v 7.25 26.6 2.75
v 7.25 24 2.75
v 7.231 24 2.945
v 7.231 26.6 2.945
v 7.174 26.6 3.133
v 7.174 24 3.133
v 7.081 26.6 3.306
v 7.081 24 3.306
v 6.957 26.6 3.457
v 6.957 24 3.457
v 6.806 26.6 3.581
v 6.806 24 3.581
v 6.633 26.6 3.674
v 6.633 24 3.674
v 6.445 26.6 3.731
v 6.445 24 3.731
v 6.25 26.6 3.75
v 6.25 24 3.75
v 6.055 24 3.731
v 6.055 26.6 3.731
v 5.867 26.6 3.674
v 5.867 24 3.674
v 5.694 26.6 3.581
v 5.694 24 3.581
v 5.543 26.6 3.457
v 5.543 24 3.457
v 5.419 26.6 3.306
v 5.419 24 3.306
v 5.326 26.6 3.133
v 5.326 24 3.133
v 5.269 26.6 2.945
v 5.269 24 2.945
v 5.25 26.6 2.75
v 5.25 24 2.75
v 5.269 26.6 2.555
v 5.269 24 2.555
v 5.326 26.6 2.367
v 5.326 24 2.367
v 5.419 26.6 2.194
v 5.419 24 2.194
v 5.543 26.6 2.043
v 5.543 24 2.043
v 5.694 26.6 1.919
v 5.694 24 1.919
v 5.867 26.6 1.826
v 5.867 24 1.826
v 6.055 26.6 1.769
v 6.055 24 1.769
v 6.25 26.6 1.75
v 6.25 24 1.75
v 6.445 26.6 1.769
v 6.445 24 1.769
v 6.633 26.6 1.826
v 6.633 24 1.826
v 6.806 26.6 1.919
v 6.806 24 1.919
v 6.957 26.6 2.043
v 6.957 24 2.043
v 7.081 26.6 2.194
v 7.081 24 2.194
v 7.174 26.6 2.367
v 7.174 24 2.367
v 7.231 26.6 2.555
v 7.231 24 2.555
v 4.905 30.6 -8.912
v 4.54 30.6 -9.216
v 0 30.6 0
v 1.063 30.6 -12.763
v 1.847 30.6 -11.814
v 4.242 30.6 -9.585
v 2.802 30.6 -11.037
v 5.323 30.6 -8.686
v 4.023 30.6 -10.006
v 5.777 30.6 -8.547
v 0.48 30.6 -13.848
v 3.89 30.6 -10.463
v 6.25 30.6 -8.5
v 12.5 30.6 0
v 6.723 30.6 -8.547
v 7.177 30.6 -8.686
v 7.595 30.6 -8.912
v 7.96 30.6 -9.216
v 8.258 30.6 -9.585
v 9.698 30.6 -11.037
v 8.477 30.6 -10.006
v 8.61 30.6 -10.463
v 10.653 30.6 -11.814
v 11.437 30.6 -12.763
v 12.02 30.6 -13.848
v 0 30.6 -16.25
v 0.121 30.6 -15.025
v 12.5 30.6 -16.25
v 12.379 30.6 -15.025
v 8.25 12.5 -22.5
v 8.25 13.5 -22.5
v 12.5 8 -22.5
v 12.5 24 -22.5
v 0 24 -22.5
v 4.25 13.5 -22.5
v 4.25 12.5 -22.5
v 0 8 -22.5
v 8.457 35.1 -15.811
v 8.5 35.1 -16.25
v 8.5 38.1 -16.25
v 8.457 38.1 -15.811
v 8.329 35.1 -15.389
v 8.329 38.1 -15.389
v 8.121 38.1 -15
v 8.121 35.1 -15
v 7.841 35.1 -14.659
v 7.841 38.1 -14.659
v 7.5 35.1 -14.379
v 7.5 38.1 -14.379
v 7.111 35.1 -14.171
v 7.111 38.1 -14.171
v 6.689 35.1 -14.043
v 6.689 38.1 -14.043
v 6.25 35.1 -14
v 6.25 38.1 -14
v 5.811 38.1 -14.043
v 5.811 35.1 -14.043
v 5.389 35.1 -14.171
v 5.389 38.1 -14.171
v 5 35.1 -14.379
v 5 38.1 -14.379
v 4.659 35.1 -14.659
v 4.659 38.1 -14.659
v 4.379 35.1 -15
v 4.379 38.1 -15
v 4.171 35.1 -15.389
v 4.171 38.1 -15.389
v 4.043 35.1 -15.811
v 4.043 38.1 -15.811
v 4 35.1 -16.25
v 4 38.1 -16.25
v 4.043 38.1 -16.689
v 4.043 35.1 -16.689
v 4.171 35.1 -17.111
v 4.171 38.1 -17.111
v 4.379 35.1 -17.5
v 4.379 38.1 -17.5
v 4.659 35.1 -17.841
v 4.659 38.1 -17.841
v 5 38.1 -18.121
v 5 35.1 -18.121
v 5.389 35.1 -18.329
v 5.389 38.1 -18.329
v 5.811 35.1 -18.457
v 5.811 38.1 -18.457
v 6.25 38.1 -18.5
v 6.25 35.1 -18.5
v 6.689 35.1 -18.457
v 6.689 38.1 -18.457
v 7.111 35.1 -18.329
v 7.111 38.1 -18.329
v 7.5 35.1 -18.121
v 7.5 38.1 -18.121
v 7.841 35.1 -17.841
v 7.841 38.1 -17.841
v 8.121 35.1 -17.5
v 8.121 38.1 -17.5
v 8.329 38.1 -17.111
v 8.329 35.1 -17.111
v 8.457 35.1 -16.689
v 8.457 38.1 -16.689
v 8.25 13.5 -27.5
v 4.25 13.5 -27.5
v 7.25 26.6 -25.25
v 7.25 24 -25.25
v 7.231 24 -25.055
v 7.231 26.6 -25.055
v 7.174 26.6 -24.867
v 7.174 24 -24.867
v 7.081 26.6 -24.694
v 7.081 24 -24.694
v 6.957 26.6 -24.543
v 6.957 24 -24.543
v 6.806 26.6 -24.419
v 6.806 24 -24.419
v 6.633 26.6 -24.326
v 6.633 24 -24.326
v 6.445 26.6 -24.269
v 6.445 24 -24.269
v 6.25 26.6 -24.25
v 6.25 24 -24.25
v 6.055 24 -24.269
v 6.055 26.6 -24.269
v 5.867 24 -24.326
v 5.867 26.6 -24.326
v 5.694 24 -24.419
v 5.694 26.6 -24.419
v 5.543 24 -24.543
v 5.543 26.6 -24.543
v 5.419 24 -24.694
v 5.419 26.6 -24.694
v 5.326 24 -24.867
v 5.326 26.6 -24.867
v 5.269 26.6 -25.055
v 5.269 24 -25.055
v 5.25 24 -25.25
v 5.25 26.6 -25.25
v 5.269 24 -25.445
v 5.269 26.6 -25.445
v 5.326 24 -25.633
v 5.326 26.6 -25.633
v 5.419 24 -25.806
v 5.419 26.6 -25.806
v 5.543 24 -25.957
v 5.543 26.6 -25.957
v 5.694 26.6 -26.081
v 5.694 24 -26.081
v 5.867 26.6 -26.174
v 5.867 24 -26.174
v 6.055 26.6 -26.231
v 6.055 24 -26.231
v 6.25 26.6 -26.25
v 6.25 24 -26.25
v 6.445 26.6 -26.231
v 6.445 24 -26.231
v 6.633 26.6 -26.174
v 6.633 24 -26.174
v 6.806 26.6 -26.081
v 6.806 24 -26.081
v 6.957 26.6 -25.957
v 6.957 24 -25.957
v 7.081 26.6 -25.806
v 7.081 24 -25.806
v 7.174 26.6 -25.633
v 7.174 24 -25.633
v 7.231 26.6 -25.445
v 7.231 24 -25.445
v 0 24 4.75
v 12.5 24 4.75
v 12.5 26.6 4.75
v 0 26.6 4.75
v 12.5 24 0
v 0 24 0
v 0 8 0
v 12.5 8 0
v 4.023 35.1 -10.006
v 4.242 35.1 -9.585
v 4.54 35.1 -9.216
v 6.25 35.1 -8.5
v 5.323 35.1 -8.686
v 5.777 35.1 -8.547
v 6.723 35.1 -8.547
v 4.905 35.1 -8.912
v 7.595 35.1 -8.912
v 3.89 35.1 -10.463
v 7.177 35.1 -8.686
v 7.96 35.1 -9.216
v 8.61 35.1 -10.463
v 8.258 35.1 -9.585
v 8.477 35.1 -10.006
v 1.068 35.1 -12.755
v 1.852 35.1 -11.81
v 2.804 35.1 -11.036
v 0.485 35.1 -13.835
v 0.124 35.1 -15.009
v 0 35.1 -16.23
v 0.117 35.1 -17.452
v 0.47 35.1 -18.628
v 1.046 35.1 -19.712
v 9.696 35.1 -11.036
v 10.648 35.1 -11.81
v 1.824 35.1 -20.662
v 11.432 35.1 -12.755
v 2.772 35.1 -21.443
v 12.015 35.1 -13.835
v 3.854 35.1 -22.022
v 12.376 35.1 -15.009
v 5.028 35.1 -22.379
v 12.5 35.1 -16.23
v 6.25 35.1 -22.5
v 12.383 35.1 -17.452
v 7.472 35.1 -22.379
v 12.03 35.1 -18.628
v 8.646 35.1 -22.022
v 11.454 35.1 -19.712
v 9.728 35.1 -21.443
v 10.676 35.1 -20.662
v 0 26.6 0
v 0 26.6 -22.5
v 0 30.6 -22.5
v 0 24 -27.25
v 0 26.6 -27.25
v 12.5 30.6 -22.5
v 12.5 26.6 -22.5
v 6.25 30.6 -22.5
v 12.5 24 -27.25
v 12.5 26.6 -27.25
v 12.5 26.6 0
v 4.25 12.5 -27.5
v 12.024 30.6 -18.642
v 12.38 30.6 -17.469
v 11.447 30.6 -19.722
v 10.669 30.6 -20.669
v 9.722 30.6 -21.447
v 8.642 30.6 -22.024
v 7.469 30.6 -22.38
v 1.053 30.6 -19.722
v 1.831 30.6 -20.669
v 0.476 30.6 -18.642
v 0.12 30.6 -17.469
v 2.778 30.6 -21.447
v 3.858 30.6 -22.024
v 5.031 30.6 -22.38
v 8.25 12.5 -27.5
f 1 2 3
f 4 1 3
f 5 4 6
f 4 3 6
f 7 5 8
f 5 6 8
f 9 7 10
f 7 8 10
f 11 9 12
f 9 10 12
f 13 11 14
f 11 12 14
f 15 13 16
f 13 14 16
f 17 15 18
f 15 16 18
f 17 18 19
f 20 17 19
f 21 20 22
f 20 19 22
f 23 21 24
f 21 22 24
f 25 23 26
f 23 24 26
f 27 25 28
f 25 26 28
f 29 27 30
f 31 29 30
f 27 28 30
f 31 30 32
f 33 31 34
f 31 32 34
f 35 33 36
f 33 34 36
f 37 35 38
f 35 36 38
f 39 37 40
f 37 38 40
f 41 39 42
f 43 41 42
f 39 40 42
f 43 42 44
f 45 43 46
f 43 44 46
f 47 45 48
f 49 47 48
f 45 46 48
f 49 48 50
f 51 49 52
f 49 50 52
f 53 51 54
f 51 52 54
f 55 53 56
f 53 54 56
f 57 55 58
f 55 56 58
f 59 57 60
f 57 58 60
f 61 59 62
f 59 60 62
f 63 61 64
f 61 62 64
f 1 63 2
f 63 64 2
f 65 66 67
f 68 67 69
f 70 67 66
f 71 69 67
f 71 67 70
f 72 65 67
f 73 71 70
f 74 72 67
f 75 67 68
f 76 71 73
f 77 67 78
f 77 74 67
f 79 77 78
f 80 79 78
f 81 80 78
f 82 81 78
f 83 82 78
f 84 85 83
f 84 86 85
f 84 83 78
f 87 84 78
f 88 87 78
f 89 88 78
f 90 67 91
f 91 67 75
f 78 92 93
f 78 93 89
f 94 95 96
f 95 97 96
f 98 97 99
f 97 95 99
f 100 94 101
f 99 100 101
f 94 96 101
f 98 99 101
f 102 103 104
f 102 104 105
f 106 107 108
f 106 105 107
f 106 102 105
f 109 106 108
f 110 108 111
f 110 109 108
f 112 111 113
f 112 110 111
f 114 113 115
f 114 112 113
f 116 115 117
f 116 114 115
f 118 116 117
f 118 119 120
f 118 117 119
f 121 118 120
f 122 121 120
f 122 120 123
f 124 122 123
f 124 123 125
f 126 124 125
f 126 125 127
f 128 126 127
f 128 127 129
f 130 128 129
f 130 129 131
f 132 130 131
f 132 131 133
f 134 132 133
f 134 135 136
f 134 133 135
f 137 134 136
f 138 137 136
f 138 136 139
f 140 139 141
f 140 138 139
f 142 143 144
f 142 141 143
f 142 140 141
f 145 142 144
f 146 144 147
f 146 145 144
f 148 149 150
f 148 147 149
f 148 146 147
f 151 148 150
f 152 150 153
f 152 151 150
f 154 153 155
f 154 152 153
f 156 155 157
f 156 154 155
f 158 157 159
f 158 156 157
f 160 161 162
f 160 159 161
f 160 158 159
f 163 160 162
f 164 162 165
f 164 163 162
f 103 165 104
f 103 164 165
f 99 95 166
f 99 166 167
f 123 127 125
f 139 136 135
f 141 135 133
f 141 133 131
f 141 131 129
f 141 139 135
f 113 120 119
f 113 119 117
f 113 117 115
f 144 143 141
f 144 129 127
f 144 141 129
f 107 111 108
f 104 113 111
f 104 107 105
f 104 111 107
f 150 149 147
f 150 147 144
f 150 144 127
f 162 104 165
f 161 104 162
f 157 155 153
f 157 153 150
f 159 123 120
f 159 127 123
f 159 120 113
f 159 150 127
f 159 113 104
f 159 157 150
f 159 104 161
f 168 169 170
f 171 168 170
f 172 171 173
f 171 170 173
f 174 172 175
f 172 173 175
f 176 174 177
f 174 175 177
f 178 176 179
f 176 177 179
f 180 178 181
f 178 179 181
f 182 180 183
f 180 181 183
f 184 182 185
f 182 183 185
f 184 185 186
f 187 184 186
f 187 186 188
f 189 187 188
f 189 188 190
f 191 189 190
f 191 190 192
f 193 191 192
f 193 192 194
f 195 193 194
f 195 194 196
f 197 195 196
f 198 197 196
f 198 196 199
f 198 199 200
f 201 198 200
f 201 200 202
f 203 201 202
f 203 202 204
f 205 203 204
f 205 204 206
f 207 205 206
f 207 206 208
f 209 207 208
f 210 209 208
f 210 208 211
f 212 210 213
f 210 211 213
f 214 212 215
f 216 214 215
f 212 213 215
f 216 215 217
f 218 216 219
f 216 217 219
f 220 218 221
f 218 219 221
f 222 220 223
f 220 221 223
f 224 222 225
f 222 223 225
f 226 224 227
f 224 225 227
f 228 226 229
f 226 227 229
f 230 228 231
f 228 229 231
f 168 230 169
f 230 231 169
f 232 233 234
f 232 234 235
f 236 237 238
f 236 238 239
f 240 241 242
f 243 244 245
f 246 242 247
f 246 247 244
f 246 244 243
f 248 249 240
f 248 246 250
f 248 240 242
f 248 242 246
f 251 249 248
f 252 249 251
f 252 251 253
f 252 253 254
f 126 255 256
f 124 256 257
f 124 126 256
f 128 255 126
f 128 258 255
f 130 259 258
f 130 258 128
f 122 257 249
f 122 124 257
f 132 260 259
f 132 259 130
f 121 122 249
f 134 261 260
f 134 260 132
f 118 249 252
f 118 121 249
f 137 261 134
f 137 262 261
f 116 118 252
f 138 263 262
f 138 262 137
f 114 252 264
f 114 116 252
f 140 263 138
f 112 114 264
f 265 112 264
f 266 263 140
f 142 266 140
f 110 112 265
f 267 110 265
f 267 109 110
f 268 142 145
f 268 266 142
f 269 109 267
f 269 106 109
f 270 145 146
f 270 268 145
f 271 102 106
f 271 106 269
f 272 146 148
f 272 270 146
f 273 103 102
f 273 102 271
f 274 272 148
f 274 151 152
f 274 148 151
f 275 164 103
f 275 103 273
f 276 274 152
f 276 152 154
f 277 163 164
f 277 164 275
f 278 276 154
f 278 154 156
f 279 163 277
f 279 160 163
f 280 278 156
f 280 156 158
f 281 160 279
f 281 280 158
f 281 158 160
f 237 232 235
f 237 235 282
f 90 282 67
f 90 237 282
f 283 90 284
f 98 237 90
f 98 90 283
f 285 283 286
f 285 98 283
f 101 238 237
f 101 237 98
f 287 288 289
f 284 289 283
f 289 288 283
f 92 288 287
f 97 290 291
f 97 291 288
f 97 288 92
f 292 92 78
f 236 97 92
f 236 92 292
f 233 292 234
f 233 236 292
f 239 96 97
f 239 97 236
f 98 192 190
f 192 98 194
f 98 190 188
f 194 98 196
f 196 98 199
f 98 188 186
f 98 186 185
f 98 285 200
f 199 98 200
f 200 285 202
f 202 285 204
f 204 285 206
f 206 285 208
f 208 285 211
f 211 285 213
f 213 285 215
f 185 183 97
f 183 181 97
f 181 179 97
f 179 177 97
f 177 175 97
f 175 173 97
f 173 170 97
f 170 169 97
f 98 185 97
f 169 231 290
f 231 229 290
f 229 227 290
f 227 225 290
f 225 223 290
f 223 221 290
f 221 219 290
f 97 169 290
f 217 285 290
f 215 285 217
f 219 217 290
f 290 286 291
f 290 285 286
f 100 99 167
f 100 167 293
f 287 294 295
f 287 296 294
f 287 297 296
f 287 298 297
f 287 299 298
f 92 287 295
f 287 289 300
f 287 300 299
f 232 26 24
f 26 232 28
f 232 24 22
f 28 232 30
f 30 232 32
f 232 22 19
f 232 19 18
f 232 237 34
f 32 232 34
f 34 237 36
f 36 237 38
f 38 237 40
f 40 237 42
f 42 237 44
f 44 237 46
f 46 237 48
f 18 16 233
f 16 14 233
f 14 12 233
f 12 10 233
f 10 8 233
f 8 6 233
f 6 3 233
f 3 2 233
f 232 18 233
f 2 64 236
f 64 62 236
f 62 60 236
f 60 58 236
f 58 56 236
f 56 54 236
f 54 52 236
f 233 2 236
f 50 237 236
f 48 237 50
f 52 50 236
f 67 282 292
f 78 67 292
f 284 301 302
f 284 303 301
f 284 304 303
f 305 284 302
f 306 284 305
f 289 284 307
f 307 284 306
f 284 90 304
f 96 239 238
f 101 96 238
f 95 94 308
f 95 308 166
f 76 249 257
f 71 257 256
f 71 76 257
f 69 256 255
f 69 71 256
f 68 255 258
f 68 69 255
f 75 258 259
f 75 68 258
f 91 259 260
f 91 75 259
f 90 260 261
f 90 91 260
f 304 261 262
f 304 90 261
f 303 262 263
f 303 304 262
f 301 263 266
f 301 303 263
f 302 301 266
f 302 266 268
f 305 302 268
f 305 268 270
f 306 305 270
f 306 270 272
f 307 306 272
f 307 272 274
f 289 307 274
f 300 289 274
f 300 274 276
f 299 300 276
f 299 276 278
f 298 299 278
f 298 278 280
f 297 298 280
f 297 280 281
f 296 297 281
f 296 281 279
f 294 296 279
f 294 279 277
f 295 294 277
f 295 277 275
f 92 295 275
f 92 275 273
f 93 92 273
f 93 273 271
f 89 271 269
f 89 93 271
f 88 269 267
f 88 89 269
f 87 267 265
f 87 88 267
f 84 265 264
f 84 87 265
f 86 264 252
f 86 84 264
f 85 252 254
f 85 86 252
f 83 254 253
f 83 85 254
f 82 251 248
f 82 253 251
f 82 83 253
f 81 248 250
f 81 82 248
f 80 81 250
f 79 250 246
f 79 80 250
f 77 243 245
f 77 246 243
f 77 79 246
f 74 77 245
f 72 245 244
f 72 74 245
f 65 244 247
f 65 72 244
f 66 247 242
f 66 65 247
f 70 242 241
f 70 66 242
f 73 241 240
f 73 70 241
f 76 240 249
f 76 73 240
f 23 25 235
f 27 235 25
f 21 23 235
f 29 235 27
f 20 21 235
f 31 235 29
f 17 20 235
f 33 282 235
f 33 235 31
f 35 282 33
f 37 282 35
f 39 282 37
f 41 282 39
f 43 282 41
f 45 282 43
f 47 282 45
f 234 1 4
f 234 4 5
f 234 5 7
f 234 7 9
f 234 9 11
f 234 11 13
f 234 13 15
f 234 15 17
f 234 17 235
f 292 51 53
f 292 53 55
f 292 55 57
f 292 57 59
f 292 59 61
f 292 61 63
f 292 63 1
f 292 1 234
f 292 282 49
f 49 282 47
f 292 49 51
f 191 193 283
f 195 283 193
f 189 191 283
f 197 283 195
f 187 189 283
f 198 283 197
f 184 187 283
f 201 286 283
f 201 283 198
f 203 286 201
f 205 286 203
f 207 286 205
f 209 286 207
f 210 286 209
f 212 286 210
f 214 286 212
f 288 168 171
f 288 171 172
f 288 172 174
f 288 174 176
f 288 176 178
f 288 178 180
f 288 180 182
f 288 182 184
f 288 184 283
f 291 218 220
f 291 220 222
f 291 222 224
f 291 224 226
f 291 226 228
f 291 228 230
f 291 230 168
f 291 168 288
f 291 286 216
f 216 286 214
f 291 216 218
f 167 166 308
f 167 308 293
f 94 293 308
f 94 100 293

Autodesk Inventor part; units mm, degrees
ref_plane "YZ Plane" through (0, 0, 0) normal (1, 0, 0) x (0, 1, 0)
ref_plane "XZ Plane" through (0, 0, 0) normal (0, 1, 0) x (-1, 0, 0)
ref_plane "XY Plane" through (0, 0, 0) normal (0, 0, 1) x (1, 0, 0)
sketch "Sketch1" plane through (0, 0, 0) normal (0, 1, 0) x (-1, 0, 0)
  line L0 (12.5, 22.5) -> (-12.5, 22.5)
  line L1 (-12.5, 22.5) -> (-12.5, -22.5)
  line L2 (-12.5, -22.5) -> (12.5, -22.5)
  line L3 (12.5, -22.5) -> (12.5, 22.5)
  line L4 (12.5, 22.5) -> (-12.5, -22.5) construction
  line L5 (-12.5, 22.5) -> (12.5, -22.5) construction
  point P0 (0, 0)
  dimension "d0" = 25
  dimension "d1" = 45
extrude "Extrusion1" add sketch "Sketch1" along normal blind 32
sketch "Sketch2" plane through (0, 32, 0) normal (0, 1, 0) x (1, 0, 0)
  line L0 (12.5, -32) -> (-12.5, -32)
  line L1 (-12.5, -32) -> (-12.5, 32)
  line L2 (-12.5, 32) -> (12.5, 32)
  line L3 (12.5, 32) -> (12.5, -32)
  line L4 (12.5, -32) -> (-12.5, 32) construction
  line L5 (-12.5, -32) -> (12.5, 32) construction
  line L6 (0, -32) -> (0, -28)
  line L7 (0, 32) -> (0, 28)
  circle A0 centre (0, -28) radius 2
  circle A1 centre (0, 28) radius 2
  point P0 (0, 0)
  dimension "d4" = 64
  dimension "d5" = 4
  dimension "d6" = 4
  dimension "d7" = 4
  dimension "d8" = 4
extrude "Extrusion2" add sketch "Sketch2" along normal blind 5.2
sketch "Sketch3" plane through (0, 37.2, 0) normal (0, 1, 0) x (1, 0, 0)
  line L0 (12.5, 22.5) -> (-12.5, 22.5) projected
  line L1 (-12.5, -22.5) -> (12.5, -22.5)
  line L2 (12.5, -22.5) -> (12.5, 22.5)
  line L3 (12.5, 22.5) -> (-12.5, 22.5)
  line L4 (-12.5, 22.5) -> (-12.5, -22.5)
  line L5 (-12.5, -22.5) -> (12.5, 22.5) construction
  line L6 (12.5, -22.5) -> (-12.5, 22.5) construction
  point P0 (0, 0)
extrude "Extrusion3" add sketch "Sketch3" along normal blind 8
sketch "Sketch4" plane through (0, 45.2, 0) normal (0, 1, 0) x (1, 0, 0)
  line L0 (-12.5, 22.5) -> (-12.5, -22.5) projected
  line L1 (12.5, 22.5) -> (-12.5, 22.5) projected
  line L2 (12.5, -22.5) -> (12.5, 22.5) projected
  arc A0 (4.7196, -1.5748) -> (-4.7196, -1.5748) centre (0, 10) ccw
  line L3 (-12.5, 22.5) -> (12.5, 22.5) projected
  arc A1 (-4.7196, -1.5748) -> (4.7196, -1.5748) centre (0, -0.7) ccw
  point P0 (0, 0)
extrude "Extrusion4" add sketch "Sketch4" along normal blind 9 contours A0 A1
sketch "Sketch5" plane through (0, 54.2, 0) normal (0, 1, 0) x (1, 0, 0)
  arc A0 (4.7196, -1.5748) -> (-4.7196, -1.5748) centre (0, 10) ccw projected
  circle A1 centre (0, 10) radius 4.5
  point P0 (0, 0)
  dimension "d18" = 9
extrude "Extrusion5" add sketch "Sketch5" along normal blind 6
sketch "Sketch6" plane through (12.5, 0, -22.5) normal (0, 0, -1) x (-1, 0, 0)
  line L0 (8.5, 11) -> (16.5, 11)
  line L1 (16.5, 11) -> (16.5, 9)
  line L2 (16.5, 9) -> (8.5, 9)
  line L3 (8.5, 9) -> (8.5, 11)
  line L4 (8.5, 11) -> (16.5, 9) construction
  line L5 (16.5, 11) -> (8.5, 9) construction
  point P0 (12.5, 0)
  dimension "d22" = 8
  dimension "d23" = 2
extrude "Extrusion6" add sketch "Sketch6" along normal blind 10
scale "Scale1" factors (0.5, 0.5, 0.5) then translate (6.25, 8, -11.25) bodies 1
properties part number "Servo"
